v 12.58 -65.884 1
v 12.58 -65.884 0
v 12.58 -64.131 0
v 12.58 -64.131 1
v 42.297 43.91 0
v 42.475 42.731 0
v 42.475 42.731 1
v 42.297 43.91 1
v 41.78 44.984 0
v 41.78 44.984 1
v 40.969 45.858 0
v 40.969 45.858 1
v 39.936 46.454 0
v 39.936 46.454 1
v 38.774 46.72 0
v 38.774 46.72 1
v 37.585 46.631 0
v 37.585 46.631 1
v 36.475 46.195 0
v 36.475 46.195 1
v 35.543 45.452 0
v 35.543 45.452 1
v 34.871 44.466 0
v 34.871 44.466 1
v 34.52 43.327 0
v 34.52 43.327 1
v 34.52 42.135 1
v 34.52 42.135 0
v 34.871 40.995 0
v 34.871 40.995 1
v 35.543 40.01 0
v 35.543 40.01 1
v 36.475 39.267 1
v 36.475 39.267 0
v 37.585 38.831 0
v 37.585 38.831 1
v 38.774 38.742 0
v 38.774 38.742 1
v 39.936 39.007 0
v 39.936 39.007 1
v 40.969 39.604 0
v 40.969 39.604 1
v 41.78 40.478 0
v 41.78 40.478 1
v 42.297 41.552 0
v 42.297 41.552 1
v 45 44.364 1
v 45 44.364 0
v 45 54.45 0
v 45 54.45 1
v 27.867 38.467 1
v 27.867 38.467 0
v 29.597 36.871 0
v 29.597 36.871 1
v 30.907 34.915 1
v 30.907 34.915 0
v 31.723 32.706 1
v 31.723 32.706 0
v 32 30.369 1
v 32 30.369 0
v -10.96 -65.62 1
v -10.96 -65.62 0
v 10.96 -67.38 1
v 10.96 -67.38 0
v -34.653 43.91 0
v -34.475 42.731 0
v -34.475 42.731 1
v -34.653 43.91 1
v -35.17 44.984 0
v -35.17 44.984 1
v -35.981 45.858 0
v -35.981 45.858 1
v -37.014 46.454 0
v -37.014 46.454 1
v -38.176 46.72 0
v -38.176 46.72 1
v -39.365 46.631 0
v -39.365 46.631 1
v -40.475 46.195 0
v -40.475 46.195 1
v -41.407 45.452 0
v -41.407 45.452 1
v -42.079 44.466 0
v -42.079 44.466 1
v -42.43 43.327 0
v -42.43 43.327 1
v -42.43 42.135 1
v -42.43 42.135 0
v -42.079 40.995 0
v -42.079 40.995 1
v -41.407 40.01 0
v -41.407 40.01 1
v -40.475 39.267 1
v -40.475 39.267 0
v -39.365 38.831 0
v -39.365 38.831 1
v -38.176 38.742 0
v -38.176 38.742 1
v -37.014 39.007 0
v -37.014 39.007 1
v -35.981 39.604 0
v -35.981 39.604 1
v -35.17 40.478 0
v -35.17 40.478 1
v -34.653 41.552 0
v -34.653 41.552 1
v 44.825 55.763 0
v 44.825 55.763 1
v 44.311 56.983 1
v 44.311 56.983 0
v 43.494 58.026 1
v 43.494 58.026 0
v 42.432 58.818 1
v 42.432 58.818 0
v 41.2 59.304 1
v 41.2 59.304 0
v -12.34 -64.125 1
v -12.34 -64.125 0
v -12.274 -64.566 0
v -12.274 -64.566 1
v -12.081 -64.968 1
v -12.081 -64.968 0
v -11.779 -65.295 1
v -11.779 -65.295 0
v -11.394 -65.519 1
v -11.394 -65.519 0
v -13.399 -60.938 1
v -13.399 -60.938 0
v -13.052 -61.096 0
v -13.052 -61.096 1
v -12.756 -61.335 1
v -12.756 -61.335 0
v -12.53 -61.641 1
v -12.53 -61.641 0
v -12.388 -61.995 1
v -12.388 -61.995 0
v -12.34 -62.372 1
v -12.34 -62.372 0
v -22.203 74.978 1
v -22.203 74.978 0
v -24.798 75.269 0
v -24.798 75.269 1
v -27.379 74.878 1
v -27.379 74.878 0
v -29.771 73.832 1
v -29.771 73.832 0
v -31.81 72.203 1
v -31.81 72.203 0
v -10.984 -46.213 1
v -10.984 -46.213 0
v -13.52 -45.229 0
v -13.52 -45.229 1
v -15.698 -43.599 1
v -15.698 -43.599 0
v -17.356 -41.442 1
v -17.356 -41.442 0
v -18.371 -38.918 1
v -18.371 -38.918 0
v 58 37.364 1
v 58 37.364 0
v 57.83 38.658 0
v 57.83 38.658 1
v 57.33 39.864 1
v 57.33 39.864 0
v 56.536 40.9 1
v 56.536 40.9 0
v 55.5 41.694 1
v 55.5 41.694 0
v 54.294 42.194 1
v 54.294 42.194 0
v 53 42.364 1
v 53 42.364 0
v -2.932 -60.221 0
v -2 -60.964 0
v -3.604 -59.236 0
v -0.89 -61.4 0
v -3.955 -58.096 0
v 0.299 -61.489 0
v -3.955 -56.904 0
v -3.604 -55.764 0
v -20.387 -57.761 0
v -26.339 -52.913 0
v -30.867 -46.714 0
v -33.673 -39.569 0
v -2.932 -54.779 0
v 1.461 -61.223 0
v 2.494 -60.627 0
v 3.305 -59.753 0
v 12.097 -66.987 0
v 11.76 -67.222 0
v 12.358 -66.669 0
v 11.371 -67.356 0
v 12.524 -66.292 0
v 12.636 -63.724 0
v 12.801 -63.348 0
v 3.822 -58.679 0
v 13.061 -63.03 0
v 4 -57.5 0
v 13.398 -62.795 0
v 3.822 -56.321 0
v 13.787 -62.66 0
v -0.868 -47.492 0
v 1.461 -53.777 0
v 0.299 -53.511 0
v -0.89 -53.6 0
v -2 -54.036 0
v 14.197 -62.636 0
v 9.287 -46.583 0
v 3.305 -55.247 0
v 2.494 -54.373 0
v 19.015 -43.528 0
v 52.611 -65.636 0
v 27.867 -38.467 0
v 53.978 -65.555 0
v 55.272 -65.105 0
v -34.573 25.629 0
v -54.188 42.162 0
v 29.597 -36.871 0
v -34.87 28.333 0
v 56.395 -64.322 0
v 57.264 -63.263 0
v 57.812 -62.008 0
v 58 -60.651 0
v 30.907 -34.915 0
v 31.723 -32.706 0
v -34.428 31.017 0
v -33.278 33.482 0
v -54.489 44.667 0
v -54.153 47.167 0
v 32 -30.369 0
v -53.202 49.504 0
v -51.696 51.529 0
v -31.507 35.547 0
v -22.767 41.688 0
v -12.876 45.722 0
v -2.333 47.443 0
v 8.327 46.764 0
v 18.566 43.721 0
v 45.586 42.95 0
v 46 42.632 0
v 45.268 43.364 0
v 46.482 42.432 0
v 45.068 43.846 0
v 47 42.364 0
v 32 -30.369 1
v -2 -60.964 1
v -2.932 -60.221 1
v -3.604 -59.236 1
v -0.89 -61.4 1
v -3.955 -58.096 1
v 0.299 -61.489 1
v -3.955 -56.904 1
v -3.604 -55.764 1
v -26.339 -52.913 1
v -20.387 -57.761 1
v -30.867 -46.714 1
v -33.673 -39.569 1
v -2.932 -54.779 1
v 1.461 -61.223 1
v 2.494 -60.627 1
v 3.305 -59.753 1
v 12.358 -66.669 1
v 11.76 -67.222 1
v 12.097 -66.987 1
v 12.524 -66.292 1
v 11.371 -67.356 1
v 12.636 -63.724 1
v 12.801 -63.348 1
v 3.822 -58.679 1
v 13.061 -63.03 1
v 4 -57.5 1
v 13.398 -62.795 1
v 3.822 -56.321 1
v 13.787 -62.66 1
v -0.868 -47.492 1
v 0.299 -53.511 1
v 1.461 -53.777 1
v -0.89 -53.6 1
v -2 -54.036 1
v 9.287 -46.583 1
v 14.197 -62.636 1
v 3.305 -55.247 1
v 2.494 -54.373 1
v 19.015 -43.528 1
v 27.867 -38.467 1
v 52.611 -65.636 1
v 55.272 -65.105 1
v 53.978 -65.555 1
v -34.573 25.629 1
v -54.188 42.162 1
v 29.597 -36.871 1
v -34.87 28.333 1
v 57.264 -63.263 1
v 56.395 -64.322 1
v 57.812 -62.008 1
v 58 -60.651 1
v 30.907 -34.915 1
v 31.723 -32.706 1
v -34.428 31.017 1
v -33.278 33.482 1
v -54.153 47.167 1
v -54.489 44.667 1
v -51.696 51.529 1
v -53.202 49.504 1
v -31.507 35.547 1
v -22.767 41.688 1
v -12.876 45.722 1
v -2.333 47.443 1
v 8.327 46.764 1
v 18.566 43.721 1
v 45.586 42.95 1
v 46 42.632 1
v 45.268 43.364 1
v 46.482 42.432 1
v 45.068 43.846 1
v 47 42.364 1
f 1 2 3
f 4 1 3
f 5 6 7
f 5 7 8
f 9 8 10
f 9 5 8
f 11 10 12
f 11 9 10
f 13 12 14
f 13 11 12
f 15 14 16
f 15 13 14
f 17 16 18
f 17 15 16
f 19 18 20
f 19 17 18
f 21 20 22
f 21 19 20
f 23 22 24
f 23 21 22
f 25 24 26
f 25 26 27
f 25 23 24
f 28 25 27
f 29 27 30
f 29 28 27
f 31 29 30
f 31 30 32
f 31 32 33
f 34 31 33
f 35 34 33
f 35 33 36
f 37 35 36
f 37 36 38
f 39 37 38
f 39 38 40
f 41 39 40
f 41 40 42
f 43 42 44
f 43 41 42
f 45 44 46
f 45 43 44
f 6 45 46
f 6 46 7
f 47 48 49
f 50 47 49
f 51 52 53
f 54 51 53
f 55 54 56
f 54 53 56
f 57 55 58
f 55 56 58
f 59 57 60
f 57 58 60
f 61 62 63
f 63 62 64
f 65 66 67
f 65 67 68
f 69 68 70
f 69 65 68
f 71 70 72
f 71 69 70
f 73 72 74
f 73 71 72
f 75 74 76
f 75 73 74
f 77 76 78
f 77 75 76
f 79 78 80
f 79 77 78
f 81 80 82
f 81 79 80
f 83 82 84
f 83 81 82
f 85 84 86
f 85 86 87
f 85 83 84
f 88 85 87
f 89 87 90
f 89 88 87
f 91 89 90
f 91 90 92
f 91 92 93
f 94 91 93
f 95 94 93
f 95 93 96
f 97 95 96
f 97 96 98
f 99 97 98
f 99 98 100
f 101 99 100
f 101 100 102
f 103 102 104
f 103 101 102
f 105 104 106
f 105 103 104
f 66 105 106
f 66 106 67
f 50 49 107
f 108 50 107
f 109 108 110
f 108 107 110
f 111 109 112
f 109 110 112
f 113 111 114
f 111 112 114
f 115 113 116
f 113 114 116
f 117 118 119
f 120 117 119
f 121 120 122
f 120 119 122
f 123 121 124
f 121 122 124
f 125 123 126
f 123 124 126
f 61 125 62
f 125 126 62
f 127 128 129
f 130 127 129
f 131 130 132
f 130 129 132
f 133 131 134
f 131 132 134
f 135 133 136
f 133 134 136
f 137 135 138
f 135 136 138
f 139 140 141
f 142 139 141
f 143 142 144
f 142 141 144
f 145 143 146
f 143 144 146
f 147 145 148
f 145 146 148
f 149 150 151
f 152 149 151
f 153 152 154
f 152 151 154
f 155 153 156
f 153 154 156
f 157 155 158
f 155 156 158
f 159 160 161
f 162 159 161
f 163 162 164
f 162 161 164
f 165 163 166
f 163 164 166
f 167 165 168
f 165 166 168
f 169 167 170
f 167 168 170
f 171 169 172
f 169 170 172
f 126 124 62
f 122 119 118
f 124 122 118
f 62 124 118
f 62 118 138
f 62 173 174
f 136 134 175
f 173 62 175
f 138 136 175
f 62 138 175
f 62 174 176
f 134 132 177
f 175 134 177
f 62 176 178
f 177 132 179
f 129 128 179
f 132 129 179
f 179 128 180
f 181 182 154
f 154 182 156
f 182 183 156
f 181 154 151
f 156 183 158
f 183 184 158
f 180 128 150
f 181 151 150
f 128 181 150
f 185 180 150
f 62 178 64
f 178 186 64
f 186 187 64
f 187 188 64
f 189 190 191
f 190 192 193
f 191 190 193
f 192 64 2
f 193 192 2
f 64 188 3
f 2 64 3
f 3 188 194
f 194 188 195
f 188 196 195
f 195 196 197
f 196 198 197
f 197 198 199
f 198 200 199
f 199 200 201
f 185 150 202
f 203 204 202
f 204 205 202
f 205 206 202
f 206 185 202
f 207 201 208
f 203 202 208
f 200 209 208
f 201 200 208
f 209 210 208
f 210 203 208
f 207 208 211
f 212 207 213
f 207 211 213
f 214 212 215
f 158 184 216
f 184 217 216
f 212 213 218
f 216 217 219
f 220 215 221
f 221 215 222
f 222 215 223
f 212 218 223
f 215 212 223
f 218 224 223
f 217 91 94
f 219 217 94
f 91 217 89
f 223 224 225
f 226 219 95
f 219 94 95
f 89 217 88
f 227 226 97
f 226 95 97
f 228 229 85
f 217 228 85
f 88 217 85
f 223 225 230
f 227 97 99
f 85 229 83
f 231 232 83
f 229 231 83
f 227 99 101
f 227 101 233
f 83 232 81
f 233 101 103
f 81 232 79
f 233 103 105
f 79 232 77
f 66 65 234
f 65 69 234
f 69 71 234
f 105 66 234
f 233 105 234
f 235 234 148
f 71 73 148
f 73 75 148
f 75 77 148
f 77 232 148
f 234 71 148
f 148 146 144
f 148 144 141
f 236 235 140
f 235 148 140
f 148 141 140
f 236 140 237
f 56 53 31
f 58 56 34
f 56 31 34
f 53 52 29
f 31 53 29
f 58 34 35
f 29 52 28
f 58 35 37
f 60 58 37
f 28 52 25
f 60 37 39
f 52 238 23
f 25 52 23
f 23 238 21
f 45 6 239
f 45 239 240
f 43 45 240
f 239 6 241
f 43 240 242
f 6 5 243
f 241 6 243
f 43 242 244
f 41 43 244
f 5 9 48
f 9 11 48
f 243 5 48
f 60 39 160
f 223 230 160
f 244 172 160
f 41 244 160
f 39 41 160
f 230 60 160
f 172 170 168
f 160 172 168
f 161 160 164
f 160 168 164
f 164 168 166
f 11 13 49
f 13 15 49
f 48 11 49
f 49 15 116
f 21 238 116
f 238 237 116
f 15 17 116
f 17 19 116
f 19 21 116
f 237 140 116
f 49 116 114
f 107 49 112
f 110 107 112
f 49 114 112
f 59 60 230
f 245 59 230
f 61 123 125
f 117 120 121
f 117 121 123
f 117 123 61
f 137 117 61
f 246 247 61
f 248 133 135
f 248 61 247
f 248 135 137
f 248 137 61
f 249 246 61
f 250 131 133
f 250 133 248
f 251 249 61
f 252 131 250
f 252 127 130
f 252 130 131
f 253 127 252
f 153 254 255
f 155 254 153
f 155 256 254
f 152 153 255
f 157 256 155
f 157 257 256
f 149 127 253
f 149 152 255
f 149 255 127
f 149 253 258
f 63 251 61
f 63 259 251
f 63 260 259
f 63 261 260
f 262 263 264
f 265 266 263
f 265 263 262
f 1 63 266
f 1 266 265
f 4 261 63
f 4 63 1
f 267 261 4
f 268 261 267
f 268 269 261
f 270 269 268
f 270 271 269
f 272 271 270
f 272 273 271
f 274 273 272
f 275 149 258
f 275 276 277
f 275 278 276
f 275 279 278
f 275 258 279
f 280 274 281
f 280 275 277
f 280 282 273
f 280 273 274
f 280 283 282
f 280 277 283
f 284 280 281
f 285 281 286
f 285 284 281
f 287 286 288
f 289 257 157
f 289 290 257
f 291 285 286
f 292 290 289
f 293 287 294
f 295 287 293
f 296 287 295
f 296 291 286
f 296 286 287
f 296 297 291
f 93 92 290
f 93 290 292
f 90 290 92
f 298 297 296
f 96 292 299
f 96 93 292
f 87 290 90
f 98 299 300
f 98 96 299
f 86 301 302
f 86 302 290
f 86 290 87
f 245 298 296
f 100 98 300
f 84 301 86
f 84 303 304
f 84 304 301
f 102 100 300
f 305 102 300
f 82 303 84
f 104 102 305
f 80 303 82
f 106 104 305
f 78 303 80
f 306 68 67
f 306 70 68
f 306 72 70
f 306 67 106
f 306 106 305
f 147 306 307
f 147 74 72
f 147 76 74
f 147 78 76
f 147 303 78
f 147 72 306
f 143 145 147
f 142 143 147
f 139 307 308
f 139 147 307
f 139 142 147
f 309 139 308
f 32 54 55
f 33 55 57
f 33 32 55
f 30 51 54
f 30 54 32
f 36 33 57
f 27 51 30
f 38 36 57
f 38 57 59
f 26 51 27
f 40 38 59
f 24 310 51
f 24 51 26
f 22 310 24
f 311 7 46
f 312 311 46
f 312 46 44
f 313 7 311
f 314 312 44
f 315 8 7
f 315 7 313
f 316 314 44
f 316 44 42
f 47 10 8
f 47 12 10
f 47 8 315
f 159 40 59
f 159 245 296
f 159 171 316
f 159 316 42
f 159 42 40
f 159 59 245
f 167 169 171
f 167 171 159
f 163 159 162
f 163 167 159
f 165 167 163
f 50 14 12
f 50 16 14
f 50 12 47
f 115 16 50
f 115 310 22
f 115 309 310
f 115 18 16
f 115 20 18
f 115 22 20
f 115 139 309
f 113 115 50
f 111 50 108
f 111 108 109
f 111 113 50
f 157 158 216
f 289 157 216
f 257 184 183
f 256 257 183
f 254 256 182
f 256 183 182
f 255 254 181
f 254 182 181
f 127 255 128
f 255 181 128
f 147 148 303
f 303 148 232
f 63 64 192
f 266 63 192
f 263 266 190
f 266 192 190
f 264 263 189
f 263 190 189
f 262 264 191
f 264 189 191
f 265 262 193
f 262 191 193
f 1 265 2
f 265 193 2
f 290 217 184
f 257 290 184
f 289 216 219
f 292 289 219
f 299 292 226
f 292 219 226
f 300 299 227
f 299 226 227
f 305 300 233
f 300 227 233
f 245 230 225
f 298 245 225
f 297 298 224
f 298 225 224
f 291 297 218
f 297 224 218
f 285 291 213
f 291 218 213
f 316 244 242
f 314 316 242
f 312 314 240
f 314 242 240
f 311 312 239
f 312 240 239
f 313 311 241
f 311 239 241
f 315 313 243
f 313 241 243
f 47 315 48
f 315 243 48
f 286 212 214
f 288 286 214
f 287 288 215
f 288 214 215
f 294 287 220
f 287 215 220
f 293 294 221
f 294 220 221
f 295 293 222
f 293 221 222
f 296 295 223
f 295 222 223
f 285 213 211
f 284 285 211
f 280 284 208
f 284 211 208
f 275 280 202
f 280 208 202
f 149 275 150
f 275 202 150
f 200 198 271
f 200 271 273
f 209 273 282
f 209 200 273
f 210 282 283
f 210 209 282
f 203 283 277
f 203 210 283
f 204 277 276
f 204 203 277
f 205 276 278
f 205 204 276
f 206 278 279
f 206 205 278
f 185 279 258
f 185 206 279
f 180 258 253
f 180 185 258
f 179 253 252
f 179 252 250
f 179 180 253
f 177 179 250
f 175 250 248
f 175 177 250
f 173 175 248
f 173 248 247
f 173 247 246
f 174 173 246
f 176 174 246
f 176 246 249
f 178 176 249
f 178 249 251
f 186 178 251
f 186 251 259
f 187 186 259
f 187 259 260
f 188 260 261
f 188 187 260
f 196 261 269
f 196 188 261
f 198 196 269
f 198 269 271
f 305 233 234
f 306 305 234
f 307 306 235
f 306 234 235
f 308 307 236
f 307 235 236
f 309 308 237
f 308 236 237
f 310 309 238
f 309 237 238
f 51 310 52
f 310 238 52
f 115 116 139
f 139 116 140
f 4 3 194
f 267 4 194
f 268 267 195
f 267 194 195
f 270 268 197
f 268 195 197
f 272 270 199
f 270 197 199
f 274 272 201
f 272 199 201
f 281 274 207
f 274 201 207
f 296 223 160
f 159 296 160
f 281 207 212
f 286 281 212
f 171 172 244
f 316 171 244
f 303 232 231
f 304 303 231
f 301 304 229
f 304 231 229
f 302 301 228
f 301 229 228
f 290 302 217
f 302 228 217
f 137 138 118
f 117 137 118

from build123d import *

# Parameters (mm, degrees)
SKETCH1_R         = 4
BUMPER_LINK_DEPTH = 1


with BuildPart() as part:
    # Sketch1 → Bumper link (new body)
    with BuildSketch(Plane.XY):
        with BuildLine():
            Line((-12.339935794, -62.372114787), (-12.339935794, -64.125193558))
            ThreePointArc((-12.339935794, -64.125193558), (-11.942206179, -65.142543055), (-10.959935794, -65.620385853))
            Line((-10.959935794, -65.620385853), (10.959935794, -67.379614147))
            ThreePointArc((10.959935794, -67.379614147), (12.097285292, -66.986692236), (12.579935794, -65.884421852))
            Line((12.579935794, -65.884421852), (12.579935794, -64.13134308))
            ThreePointArc((12.579935794, -64.13134308), (13.061403486, -63.030165558), (14.196725042, -62.635896568))
            Line((14.196725042, -62.635896568), (52.610702507, -65.635896568))
            ThreePointArc((52.610702507, -65.635896568), (56.395107696, -64.321666601), (58, -60.65107486))
            Line((58, -60.65107486), (58, 37.364103432))
            ThreePointArc((58, 37.364103432), (56.535533906, 40.899637338), (53, 42.364103432))
            Line((53, 42.364103432), (47, 42.364103432))
            ThreePointArc((47, 42.364103432), (45.585786438, 42.94988987), (45, 44.364103432))
            Line((45, 44.364103432), (45, 54.449696626))
            ThreePointArc((45, 54.449696626), (43.937003937, 57.531903627), (41.2, 59.303561066))
            Line((41.2, 59.303561066), (-22.203206715, 74.978462786))
            ThreePointArc((-22.203206715, 74.978462786), (-27.378610186, 74.877873729), (-31.810346538, 72.203059315))
            Line((-31.810346538, 72.203059315), (-51.696396663, 51.528677297))
            ThreePointArc((-51.696396663, 51.528677297), (-54.153116802, 47.167307088), (-54.188361237, 42.161732018))
            Line((-54.188361237, 42.161732018), (-33.67267763, -39.569202441))
            ThreePointArc((-33.67267763, -39.569202441), (-26.339013672, -52.913431655), (-13.39876573, -60.938458979))
            ThreePointArc((-13.39876573, -60.938458979), (-12.633338286, -61.480979302), (-12.339935794, -62.372114787))
        make_face()
        with Locations((0, -57.5)):
            Circle(SKETCH1_R, mode=Mode.SUBTRACT)
        with Locations((-38.475009866, 42.730827465)):
            Circle(SKETCH1_R, mode=Mode.SUBTRACT)
        with Locations((38.475009866, 42.730827465)):
            Circle(SKETCH1_R, mode=Mode.SUBTRACT)
        with BuildLine():
            Line((32, 30.368569278), (32, -30.368569278))
            ThreePointArc((32, -30.368569278), (30.906926144, -34.914629844), (27.866666667, -38.466854419))
            ThreePointArc((27.866666667, -38.466854419), (9.287328638, -46.583210782), (-10.984071313, -46.212554327))
            ThreePointArc((-10.984071313, -46.212554327), (-15.698093899, -43.598992826), (-18.370739643, -38.918215391))
            Line((-18.370739643, -38.918215391), (-34.572943336, 25.628561282))
            ThreePointArc((-34.572943336, 25.628561282), (-34.427736148, 31.016661832), (-31.506862657, 35.546696127))
            ThreePointArc((-31.506862657, 35.546696127), (-2.333364057, 47.442653933), (27.866666667, 38.466854419))
            ThreePointArc((27.866666667, 38.466854419), (30.906926144, 34.914629844), (32, 30.368569278))
        make_face(mode=Mode.SUBTRACT)
    extrude(amount=BUMPER_LINK_DEPTH)


solid = part.part
